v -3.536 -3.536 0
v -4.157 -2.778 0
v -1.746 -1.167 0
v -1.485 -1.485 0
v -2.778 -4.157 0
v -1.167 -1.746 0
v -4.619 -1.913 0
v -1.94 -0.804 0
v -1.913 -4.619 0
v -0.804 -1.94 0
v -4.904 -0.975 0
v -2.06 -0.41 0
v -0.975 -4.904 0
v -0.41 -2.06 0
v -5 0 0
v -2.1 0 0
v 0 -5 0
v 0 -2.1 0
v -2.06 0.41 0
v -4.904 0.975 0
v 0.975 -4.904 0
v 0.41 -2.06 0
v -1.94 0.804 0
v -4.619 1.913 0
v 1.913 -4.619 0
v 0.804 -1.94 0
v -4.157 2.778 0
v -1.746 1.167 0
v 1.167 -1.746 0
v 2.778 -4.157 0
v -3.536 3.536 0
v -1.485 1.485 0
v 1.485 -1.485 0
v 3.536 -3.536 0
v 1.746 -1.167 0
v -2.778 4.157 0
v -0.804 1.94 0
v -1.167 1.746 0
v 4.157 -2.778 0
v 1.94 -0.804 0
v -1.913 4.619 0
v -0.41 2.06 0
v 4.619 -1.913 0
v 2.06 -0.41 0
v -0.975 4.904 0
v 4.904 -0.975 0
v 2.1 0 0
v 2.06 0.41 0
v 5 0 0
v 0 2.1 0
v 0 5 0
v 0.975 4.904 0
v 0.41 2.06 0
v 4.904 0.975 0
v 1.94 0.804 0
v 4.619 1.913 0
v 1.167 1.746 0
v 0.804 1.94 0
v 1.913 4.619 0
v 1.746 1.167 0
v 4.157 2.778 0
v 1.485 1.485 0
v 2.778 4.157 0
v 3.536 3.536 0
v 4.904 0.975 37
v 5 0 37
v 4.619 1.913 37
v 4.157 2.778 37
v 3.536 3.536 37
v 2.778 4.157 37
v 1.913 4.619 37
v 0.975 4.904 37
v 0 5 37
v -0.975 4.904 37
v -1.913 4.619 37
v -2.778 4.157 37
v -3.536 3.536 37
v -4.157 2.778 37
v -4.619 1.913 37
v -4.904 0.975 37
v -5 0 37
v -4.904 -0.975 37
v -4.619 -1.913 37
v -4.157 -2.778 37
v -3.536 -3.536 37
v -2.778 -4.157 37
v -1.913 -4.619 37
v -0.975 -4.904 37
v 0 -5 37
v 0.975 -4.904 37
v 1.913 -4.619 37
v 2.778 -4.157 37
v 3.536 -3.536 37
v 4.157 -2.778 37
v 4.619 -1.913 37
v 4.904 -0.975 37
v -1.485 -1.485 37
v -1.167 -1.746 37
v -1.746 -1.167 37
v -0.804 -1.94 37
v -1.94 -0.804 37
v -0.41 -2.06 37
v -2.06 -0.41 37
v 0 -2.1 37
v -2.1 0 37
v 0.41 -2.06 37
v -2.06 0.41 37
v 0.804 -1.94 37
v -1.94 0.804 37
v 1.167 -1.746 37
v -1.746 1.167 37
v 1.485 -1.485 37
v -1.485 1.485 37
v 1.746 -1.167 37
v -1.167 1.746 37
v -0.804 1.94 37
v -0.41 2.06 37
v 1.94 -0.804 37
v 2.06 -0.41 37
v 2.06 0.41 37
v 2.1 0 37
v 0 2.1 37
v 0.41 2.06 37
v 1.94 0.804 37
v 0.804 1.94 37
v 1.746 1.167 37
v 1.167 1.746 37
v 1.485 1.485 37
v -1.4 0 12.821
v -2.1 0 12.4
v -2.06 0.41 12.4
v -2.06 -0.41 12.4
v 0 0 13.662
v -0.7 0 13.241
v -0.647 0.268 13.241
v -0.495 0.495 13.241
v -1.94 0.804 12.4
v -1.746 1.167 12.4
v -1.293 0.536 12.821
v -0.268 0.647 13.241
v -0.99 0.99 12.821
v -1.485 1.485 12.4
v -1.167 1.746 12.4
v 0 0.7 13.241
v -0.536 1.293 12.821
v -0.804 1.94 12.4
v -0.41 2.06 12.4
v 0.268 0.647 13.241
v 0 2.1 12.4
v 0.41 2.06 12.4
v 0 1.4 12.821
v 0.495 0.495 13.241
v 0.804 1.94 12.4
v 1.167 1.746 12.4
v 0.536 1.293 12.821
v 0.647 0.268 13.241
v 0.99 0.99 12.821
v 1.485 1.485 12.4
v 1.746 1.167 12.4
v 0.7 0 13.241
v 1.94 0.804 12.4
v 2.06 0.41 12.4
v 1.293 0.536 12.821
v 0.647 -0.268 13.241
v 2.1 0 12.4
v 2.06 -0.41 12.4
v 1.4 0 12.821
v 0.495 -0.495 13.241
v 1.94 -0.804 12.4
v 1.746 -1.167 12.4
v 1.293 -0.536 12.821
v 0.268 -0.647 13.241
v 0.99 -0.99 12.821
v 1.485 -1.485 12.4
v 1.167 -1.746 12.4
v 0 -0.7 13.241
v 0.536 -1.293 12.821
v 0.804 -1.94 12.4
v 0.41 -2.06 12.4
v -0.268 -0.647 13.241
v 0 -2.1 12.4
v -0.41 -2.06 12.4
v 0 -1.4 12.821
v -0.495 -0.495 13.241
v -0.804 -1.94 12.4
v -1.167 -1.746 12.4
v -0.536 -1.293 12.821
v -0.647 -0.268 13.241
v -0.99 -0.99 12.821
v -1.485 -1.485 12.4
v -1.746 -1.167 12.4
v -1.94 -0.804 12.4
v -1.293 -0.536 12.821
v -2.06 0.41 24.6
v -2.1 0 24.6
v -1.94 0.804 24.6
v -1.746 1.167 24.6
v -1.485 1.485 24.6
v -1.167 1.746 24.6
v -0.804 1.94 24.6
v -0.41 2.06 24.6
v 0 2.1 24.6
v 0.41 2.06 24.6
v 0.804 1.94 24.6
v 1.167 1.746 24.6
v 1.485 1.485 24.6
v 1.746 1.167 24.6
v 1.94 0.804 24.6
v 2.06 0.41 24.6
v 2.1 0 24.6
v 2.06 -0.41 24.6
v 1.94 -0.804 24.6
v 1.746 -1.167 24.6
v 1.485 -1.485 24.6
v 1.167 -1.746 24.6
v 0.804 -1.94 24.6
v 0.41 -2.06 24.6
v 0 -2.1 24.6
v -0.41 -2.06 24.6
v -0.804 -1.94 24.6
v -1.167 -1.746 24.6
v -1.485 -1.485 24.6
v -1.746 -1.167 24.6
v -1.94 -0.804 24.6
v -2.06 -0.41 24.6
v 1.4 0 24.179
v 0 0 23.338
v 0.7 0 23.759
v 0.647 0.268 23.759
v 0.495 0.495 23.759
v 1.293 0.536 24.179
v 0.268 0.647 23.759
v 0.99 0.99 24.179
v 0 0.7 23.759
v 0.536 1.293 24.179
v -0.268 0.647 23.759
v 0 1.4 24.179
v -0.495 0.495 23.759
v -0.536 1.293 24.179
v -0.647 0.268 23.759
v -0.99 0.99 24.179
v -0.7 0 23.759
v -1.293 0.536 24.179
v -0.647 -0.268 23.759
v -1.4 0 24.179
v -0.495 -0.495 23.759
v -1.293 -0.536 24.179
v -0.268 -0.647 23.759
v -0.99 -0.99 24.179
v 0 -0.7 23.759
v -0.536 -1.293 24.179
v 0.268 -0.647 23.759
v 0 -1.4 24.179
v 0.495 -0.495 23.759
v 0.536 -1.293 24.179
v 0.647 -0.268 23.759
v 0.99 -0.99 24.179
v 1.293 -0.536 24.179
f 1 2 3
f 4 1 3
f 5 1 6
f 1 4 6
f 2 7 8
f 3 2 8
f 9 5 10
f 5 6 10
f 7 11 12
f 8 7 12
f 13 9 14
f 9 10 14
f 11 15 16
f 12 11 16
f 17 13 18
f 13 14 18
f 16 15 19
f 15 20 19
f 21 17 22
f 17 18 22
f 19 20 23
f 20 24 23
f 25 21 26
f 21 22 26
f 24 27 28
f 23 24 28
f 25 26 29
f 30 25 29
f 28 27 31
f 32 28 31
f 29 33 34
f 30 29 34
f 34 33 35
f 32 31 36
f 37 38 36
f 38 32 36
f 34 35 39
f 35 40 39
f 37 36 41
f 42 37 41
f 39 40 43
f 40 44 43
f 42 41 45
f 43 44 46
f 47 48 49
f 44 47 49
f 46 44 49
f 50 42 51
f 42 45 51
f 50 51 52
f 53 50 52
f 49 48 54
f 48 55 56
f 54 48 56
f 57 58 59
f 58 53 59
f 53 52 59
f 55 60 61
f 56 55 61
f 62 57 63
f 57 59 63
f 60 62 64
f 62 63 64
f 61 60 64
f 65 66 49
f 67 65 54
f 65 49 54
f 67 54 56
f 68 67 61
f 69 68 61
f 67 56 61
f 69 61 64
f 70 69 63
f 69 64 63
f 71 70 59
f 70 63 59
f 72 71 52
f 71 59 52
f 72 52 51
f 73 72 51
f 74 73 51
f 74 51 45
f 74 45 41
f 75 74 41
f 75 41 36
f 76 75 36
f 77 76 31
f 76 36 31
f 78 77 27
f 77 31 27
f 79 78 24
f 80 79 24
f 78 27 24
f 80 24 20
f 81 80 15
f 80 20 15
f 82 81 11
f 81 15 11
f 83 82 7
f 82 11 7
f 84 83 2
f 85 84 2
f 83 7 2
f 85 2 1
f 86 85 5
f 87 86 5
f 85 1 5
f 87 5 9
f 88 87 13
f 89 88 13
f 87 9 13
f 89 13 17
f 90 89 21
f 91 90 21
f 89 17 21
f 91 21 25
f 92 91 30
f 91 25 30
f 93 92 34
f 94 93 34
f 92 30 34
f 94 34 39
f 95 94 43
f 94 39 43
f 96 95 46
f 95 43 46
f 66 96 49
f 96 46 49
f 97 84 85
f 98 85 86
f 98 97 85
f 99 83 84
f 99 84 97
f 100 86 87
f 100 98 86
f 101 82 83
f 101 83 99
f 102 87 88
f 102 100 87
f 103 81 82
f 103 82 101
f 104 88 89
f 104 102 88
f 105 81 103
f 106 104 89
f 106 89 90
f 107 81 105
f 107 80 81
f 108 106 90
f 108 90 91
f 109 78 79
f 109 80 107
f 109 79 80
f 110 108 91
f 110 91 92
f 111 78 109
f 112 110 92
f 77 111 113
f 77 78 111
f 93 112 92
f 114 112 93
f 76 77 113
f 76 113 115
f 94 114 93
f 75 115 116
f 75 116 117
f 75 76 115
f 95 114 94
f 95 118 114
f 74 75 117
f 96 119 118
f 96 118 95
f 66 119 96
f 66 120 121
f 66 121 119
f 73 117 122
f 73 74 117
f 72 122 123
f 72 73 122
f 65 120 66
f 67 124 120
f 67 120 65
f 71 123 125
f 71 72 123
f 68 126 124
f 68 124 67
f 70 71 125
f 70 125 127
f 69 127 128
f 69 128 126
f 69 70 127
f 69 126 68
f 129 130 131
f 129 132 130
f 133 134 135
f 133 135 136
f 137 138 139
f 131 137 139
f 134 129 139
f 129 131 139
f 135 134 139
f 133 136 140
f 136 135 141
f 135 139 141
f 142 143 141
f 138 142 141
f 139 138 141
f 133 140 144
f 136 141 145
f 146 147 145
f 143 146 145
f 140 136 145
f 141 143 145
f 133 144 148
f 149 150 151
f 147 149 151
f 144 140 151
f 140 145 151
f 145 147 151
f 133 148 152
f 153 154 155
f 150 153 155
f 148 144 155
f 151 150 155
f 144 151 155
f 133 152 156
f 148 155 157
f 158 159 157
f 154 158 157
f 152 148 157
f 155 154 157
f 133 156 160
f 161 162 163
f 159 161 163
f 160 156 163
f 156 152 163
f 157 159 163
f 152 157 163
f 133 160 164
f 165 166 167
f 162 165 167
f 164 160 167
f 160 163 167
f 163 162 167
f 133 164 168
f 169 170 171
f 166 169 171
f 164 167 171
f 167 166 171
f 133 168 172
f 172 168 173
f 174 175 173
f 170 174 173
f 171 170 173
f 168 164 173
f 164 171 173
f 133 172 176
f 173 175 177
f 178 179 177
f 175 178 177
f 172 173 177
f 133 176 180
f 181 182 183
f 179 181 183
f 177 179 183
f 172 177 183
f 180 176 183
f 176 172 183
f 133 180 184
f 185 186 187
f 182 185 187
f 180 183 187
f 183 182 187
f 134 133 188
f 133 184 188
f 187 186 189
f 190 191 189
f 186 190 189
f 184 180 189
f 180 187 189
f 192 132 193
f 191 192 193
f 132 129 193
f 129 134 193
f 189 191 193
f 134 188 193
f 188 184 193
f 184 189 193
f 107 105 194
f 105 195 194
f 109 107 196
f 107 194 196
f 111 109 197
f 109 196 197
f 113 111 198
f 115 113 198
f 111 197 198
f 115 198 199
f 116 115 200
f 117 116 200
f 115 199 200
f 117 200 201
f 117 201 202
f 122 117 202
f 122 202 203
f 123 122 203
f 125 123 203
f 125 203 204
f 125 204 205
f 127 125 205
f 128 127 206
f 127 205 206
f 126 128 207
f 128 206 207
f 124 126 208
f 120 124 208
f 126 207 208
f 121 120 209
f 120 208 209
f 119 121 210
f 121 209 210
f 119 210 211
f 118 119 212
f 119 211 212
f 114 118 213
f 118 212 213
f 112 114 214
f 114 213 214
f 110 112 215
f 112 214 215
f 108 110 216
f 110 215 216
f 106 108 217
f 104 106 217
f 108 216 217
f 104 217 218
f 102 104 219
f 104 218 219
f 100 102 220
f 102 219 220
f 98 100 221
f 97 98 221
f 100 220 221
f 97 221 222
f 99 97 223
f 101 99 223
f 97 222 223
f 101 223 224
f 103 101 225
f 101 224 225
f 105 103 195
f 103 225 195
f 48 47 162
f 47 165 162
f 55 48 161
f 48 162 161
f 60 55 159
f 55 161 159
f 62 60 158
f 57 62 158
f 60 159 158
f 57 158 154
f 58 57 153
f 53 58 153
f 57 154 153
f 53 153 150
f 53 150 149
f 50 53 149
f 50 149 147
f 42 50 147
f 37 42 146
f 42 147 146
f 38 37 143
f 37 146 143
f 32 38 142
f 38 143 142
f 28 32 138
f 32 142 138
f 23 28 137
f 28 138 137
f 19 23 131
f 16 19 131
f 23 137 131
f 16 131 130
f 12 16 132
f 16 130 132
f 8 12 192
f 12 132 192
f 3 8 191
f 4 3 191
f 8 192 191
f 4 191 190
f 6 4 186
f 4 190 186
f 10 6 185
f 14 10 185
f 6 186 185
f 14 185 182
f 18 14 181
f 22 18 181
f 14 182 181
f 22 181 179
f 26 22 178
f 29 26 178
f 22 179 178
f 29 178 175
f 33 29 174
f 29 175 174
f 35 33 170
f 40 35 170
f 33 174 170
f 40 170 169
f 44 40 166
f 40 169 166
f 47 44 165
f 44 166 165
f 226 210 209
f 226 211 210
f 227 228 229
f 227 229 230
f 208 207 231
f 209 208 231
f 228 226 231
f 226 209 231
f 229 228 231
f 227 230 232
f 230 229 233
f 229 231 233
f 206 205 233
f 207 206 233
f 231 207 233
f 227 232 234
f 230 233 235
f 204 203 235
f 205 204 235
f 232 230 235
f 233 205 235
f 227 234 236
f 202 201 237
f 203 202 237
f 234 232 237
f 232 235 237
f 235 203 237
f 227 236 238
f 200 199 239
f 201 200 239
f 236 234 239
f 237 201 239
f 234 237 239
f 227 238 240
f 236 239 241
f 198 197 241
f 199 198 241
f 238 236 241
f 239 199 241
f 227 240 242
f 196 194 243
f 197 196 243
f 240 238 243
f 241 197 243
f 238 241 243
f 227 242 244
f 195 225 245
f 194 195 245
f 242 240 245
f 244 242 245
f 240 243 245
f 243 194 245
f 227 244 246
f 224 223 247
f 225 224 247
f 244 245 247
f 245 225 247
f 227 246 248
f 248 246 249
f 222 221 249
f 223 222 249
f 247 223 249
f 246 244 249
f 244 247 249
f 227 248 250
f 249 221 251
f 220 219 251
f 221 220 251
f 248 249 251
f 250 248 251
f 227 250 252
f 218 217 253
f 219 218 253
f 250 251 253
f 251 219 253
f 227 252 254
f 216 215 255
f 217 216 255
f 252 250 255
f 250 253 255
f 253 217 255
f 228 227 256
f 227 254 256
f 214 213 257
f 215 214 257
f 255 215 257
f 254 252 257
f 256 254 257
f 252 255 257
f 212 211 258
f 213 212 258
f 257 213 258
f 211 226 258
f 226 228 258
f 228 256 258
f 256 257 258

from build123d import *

# Parameters (mm, degrees)
SKETCH_1_R             = 5
EXTRUDE_1_DEPTH        = 37
HOLE_WIZARD_M5_1_D     = 4.2
HOLE_WIZARD_M5_1_DEPTH = 12.4
HOLE_WIZARD_M5_1_TIP   = 1.2618073
HOLE_WIZARD_M5_2_D     = 4.2
HOLE_WIZARD_M5_2_DEPTH = 12.4
HOLE_WIZARD_M5_2_TIP   = 1.2618073


with BuildPart() as part:
    # 草图1 → 凸台-拉伸1 (new body)
    with BuildSketch(Plane.XY):
        Circle(SKETCH_1_R)
    extrude(amount=EXTRUDE_1_DEPTH)

    # M5 螺纹孔1
    with Locations(Plane.XY.offset(37)):
        with Locations((0, 0)):
            Hole(HOLE_WIZARD_M5_1_D / 2, depth=HOLE_WIZARD_M5_1_DEPTH)
            with Locations((0, 0, -(HOLE_WIZARD_M5_1_DEPTH + HOLE_WIZARD_M5_1_TIP / 2))):  # 118° drill point
                Cone(0, HOLE_WIZARD_M5_1_D / 2, HOLE_WIZARD_M5_1_TIP, mode=Mode.SUBTRACT)

    # M5 螺纹孔2
    with Locations(Plane(origin=(0, 0, 0), x_dir=(-1, 0, 0), z_dir=(0, 0, -1))):
        with Locations((0, 0)):
            Hole(HOLE_WIZARD_M5_2_D / 2, depth=HOLE_WIZARD_M5_2_DEPTH)
            with Locations((0, 0, -(HOLE_WIZARD_M5_2_DEPTH + HOLE_WIZARD_M5_2_TIP / 2))):  # 118° drill point
                Cone(0, HOLE_WIZARD_M5_2_D / 2, HOLE_WIZARD_M5_2_TIP, mode=Mode.SUBTRACT)


solid = part.part
